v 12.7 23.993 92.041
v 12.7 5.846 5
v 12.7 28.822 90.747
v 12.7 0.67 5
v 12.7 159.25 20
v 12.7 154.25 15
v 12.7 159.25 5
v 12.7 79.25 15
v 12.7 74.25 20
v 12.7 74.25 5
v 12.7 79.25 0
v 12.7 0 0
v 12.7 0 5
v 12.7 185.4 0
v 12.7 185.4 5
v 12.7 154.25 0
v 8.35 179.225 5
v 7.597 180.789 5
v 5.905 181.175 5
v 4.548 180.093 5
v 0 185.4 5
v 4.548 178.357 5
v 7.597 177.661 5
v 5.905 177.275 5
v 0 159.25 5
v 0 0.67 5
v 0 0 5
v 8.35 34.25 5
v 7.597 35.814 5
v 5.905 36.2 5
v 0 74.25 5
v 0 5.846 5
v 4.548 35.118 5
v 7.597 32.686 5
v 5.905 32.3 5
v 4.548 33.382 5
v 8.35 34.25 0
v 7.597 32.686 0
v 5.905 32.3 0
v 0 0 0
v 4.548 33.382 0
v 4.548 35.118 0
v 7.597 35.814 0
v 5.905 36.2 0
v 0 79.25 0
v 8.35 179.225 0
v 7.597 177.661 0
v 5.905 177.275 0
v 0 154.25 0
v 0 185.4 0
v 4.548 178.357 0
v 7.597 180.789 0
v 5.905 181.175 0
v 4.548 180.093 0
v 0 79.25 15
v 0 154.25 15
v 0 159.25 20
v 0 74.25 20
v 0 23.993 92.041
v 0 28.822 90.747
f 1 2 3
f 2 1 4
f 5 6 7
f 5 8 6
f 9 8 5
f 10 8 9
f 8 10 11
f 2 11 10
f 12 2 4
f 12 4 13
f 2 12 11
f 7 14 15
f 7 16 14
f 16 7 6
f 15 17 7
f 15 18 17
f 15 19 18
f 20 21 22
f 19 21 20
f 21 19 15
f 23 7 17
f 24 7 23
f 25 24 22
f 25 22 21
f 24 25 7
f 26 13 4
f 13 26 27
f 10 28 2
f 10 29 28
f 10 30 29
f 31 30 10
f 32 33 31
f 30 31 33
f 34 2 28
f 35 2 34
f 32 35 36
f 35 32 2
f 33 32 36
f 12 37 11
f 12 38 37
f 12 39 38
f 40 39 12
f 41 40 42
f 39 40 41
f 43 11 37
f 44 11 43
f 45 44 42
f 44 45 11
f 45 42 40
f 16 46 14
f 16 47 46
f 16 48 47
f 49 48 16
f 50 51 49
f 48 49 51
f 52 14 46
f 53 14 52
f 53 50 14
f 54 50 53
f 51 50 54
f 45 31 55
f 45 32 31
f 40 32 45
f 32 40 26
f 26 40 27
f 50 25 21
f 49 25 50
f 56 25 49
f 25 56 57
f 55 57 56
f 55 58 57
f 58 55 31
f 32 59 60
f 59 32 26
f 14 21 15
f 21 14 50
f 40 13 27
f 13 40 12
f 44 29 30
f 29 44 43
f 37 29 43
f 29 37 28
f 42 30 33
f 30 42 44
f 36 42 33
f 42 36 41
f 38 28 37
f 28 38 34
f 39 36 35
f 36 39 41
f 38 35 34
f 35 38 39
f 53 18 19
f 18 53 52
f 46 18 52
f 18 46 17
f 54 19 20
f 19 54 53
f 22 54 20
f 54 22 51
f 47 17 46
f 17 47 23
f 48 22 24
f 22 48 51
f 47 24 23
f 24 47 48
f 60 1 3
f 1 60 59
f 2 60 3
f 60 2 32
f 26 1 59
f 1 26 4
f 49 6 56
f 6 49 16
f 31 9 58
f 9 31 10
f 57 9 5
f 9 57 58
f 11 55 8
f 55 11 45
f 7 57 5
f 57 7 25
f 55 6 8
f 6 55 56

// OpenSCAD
// SPDX-FileCopyrightText: 2023 John Romkey
//
// SPDX-License-Identifier: MIT

width = 25.4/2;
height = 5;
length = 160 + 25.4; // 180

offset = 25.4/4;

diameter = 4;

module bracket() {
difference() {
  cube([width, length, height]);
  translate([(width)/2, offset + 2.5 +25.4, 0])
    cylinder(height*2, d = diameter, center = true);
  translate([(width)/2, 160 - 25.4/8 - 3 + 25.4, 0])
    cylinder(height*2, d = diameter, center = true);
}

translate([0, 0, height/2])
  rotate([-15, 0, 0])
    cube([width, height, length/2]);
}

module modified_bracket() {
    difference() {
        bracket();
        translate([0, offset + 27.9 + 160/4, 0])
          cube([width, 160/2, height]);
    }

    translate([0, offset + 27.9 + 160/4, 0])
      cube([width, height, 20]);
    translate([0, offset + 27.9 + 3*160/4, 0])
      cube([width, height, 20]);
    translate([0, offset + 27.9 + 160/4, 20-height])
      cube([width, 160/2, height]);
}

modified_bracket();
